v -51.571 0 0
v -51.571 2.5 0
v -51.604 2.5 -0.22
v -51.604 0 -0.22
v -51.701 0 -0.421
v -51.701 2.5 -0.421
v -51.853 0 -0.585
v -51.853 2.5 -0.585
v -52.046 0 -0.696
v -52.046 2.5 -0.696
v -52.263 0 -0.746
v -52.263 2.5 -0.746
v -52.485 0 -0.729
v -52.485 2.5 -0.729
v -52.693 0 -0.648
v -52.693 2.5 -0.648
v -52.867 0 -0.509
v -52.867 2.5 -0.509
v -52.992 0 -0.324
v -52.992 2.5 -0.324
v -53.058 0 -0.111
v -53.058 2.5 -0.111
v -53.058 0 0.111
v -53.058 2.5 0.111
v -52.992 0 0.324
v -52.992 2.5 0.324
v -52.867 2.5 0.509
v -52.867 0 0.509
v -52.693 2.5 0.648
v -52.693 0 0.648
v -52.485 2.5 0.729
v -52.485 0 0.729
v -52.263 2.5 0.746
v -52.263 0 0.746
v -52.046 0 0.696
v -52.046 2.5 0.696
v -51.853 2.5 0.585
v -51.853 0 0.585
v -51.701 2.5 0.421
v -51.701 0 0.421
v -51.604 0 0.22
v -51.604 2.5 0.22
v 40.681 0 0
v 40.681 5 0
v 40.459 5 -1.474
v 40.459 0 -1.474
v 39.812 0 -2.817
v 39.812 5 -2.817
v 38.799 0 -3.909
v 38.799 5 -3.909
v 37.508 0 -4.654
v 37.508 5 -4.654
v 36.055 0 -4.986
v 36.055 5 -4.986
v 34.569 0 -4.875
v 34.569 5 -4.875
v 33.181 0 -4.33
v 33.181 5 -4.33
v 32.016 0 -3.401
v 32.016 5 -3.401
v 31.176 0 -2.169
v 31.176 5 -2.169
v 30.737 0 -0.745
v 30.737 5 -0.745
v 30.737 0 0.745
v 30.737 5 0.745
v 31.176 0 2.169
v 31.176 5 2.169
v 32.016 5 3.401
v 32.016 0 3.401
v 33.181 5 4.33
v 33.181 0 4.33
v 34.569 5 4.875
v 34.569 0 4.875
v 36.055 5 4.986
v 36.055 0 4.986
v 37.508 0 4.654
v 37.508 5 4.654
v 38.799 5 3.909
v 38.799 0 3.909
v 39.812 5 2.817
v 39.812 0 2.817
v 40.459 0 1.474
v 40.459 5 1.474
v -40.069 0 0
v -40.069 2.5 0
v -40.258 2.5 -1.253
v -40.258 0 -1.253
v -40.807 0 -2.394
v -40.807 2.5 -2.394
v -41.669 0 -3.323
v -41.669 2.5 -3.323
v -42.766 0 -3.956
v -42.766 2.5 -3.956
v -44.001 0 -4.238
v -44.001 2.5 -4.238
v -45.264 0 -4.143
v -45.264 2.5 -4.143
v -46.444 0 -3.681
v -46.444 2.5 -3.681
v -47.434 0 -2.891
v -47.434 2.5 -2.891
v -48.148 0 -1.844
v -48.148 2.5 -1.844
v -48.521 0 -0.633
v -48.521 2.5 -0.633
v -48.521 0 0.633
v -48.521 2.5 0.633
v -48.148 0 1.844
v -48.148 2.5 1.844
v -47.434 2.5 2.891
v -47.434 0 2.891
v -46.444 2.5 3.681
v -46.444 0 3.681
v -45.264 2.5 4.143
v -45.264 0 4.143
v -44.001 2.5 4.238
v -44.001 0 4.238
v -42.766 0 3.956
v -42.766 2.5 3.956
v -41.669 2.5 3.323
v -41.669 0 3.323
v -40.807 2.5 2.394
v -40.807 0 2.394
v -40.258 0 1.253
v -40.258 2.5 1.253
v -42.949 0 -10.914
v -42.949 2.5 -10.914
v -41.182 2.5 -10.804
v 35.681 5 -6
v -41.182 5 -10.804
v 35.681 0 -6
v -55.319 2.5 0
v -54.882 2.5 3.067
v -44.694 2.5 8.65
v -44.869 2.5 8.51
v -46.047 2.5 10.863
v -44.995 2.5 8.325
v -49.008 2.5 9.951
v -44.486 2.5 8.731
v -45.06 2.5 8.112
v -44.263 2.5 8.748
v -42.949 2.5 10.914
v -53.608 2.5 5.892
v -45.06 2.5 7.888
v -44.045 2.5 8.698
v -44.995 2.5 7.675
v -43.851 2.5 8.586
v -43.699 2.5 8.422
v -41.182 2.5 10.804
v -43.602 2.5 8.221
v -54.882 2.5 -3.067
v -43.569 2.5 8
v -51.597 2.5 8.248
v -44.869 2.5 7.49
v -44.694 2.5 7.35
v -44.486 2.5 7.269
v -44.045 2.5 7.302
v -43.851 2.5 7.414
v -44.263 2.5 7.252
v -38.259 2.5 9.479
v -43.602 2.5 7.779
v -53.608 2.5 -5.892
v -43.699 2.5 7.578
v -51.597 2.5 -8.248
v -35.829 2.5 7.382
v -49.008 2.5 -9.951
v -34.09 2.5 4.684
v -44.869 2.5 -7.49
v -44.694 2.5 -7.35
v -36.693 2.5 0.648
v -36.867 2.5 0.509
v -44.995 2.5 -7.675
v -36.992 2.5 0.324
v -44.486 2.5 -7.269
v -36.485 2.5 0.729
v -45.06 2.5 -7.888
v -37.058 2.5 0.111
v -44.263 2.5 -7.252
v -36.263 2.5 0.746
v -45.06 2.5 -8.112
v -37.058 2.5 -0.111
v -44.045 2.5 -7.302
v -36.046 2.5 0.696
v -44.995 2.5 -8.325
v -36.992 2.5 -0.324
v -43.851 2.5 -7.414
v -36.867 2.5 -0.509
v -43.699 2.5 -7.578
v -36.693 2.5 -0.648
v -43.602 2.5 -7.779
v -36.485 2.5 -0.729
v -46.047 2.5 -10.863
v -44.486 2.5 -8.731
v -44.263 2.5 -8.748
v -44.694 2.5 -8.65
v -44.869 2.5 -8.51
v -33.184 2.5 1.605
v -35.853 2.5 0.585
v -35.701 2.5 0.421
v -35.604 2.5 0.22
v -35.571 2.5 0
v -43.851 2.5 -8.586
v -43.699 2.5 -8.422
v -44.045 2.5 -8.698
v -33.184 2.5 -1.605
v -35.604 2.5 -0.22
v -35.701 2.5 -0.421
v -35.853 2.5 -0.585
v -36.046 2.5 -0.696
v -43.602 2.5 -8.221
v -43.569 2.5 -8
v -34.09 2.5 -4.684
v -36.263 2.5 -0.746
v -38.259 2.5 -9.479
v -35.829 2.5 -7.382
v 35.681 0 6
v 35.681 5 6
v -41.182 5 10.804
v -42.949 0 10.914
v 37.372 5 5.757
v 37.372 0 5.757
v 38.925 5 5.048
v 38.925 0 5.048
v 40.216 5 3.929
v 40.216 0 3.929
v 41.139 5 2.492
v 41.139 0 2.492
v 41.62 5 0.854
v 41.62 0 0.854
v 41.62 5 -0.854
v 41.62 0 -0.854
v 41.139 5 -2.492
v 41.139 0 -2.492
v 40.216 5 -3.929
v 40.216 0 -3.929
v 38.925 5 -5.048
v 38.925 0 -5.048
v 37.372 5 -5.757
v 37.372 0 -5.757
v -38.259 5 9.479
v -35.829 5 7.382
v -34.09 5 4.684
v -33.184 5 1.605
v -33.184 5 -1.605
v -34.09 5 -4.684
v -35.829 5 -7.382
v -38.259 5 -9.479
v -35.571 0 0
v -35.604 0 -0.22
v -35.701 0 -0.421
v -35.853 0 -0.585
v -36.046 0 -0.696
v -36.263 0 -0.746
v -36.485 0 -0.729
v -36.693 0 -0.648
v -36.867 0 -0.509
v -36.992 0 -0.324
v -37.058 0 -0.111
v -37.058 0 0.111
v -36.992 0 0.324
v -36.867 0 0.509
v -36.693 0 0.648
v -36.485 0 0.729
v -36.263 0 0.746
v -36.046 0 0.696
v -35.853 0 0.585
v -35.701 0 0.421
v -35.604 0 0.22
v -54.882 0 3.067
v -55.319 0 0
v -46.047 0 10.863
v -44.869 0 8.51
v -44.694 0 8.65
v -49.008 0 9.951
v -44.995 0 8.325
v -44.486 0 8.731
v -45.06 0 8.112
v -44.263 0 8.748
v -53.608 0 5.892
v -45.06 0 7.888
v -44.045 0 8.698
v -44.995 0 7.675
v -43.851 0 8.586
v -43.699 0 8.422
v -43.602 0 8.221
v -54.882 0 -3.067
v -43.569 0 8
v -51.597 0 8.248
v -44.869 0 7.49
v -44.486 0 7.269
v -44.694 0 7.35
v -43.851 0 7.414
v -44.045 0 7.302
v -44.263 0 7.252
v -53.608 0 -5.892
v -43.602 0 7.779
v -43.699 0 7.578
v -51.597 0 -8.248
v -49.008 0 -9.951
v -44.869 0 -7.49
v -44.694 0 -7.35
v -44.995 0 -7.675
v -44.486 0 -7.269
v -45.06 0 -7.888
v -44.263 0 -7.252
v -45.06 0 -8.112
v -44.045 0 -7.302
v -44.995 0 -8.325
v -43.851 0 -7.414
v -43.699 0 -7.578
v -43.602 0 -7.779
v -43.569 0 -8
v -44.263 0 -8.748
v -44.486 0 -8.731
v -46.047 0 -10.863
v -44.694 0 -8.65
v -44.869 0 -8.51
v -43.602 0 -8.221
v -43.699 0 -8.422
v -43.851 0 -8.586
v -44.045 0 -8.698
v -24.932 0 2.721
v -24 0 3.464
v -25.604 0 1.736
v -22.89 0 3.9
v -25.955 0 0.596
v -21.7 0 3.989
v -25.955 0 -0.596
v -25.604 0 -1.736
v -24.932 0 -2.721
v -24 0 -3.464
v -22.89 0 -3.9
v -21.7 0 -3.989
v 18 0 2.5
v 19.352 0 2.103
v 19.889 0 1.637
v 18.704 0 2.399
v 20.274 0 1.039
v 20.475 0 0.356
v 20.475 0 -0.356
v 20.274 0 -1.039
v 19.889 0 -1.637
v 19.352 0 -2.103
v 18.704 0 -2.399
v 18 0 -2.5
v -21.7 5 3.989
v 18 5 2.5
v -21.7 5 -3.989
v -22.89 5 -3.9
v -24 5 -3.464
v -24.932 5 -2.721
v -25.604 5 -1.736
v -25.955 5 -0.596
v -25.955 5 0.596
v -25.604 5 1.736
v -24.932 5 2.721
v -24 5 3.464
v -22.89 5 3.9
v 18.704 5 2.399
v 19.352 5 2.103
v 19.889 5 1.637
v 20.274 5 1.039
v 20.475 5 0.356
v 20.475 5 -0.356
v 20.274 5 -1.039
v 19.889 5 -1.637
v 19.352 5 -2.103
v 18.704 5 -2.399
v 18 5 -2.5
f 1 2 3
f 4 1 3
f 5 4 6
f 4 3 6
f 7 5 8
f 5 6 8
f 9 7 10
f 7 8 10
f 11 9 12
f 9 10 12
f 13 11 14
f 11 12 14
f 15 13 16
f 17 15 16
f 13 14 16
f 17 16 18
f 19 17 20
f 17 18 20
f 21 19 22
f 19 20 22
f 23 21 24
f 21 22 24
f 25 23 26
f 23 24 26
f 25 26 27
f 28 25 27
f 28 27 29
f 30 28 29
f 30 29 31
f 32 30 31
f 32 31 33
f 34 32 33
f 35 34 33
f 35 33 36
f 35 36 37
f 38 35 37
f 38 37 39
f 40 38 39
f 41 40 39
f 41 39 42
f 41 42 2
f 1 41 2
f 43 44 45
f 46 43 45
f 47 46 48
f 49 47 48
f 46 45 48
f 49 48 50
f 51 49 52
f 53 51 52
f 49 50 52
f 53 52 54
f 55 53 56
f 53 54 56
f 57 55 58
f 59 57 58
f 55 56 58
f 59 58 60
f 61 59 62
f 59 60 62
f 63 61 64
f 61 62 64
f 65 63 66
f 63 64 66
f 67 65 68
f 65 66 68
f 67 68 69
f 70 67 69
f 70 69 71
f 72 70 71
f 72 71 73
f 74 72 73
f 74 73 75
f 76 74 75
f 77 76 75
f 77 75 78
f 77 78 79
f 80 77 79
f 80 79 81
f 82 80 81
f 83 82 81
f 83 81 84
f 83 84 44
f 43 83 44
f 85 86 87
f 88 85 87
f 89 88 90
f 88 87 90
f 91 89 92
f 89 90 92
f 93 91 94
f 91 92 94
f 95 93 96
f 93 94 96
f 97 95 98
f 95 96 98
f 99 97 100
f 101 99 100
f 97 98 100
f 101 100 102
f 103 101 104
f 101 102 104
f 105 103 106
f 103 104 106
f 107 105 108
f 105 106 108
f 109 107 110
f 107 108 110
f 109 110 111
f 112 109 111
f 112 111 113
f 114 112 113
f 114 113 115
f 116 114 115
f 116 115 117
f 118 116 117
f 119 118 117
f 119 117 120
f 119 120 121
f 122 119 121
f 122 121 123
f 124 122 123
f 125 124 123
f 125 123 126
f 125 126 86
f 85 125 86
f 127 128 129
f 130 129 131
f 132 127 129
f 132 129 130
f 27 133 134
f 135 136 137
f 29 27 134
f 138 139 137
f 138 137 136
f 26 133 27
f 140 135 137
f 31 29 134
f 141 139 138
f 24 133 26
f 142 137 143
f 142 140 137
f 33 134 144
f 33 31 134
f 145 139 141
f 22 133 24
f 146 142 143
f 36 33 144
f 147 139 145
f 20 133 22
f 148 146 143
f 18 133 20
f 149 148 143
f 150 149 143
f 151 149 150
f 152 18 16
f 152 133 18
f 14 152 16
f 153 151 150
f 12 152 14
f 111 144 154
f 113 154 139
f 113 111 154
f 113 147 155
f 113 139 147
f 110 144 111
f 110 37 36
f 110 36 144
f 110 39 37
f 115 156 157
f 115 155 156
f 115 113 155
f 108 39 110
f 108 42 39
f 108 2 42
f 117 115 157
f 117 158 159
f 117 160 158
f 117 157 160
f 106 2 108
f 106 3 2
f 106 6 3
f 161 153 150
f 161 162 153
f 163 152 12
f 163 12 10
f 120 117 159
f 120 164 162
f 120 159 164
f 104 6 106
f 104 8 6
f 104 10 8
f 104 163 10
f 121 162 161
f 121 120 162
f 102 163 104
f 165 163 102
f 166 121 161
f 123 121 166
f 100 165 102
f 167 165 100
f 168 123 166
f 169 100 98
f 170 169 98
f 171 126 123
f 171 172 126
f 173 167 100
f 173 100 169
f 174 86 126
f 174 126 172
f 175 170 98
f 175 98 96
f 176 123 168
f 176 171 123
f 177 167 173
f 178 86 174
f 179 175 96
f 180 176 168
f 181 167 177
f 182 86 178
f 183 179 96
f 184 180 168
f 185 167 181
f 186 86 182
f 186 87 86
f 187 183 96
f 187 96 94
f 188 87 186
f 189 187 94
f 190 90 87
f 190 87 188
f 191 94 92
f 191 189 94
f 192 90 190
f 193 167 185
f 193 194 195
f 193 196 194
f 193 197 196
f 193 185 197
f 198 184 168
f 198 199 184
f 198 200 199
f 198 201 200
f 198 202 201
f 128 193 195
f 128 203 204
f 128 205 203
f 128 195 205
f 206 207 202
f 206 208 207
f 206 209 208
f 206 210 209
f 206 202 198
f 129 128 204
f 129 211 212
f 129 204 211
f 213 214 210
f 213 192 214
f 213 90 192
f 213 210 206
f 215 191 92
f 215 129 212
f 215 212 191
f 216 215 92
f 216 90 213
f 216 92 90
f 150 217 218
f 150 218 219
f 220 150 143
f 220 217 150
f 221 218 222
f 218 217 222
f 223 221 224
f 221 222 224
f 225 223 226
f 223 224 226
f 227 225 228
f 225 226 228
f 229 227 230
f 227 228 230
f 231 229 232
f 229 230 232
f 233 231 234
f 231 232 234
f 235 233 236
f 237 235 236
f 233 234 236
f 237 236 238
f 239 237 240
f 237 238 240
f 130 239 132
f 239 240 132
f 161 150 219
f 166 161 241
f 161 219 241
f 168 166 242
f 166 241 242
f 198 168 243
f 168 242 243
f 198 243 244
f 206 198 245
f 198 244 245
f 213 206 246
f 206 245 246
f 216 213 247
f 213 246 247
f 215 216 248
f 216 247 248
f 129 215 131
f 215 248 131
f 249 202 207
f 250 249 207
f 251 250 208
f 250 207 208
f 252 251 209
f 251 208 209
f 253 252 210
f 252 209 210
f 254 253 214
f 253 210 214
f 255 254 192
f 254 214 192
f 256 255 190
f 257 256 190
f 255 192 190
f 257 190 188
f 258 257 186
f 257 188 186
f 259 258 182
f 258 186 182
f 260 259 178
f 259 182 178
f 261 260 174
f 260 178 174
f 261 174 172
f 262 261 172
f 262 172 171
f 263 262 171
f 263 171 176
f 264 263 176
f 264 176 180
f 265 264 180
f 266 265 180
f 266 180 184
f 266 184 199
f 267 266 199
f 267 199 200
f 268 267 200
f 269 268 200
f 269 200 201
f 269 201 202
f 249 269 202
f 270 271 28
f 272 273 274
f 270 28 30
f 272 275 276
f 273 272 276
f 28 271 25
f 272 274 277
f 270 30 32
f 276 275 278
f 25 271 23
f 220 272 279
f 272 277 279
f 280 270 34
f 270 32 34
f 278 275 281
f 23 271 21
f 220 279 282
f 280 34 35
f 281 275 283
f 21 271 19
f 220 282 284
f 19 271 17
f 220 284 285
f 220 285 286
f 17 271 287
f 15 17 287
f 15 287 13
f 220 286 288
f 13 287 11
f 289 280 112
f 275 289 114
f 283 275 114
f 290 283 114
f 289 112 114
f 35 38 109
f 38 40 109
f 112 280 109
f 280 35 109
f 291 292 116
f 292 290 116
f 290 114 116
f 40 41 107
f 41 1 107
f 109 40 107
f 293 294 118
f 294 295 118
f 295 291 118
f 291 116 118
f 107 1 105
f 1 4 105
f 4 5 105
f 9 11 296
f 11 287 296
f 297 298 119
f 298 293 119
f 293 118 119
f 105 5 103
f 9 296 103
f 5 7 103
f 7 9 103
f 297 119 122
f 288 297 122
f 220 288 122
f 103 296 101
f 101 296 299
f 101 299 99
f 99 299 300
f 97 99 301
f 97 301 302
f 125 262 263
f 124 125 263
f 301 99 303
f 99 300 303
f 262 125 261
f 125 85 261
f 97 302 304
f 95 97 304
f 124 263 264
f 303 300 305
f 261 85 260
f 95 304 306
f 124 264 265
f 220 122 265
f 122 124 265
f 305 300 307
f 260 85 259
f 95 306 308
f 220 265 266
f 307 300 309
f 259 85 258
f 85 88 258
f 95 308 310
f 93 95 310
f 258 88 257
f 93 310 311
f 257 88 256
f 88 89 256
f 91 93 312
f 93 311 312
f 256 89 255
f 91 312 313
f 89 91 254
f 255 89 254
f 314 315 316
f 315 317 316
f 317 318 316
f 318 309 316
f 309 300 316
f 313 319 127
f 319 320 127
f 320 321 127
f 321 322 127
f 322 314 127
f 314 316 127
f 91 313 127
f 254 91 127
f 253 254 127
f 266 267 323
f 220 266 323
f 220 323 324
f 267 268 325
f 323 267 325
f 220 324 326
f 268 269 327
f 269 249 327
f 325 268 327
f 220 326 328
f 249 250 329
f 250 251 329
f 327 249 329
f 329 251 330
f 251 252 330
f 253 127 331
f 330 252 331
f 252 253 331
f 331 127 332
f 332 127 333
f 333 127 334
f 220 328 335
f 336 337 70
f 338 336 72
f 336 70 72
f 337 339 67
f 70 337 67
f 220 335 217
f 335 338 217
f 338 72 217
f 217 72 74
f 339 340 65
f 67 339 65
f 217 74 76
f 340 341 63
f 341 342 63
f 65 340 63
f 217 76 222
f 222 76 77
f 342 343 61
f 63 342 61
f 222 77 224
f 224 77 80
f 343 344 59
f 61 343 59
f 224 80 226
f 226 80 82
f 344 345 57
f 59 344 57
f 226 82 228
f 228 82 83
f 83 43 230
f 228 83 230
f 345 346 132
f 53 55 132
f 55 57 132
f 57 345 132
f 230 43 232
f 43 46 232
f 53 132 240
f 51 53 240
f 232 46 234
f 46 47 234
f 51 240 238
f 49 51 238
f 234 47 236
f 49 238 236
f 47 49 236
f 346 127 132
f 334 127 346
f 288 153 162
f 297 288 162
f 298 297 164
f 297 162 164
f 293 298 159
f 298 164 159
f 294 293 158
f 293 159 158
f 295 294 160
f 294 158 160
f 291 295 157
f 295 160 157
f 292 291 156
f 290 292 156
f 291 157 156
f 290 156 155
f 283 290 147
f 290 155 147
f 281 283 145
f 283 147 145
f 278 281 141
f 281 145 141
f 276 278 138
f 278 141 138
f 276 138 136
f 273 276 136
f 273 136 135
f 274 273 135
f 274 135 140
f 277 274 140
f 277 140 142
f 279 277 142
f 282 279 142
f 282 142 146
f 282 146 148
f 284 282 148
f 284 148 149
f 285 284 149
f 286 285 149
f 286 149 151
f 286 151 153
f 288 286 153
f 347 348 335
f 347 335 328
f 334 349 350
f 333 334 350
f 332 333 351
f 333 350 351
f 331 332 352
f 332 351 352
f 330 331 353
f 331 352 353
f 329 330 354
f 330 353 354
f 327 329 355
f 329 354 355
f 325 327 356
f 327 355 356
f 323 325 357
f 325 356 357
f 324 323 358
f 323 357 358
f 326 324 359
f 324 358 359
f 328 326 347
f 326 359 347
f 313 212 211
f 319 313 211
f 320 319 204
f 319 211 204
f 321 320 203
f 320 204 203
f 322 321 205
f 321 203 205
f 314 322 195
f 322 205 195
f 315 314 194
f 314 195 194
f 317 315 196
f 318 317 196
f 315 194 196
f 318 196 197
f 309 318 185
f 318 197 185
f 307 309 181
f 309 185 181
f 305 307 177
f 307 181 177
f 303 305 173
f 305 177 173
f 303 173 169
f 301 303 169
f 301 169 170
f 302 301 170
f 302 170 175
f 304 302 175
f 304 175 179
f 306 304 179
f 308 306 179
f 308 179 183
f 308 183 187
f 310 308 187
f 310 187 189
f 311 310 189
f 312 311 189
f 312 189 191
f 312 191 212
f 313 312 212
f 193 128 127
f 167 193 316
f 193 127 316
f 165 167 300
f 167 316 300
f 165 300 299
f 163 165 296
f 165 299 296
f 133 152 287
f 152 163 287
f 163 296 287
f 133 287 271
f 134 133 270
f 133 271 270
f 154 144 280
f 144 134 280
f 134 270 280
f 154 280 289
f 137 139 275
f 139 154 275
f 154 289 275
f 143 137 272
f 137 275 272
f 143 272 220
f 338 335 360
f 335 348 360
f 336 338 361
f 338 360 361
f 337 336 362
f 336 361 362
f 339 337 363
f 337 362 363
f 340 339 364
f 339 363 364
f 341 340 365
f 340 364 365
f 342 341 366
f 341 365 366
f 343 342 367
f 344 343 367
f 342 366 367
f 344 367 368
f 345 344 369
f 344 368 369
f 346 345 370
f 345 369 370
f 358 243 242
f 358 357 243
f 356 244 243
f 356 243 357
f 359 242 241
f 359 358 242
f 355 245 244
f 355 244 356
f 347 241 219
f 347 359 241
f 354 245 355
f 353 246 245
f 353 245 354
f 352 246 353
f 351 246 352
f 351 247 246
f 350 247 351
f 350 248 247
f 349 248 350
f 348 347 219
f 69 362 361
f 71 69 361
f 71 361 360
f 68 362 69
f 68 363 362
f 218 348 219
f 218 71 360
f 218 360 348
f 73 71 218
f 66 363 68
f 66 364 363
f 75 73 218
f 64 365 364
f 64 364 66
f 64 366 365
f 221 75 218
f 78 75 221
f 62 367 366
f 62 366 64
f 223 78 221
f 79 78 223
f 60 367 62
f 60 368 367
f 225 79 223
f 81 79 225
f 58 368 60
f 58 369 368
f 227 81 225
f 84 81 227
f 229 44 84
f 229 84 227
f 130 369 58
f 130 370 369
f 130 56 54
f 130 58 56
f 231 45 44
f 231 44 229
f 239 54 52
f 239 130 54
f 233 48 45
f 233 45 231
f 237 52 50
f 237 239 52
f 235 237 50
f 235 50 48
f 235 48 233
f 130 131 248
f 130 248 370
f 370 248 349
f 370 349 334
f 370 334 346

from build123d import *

# Parameters (mm, degrees)
SKETCH_1_R          = 11
EXTRUDE_1_DEPTH     = 5
SKETCH_1_R_2        = 6
EXTRUDE_1_2_DEPTH   = 5
EXTRUDE_3_DEPTH     = 5
SKETCH_4_R          = 11.25
CUT_EXTRUDE_1_DEPTH = 2.5
SKETCH_5_R          = 5
CUT_EXTRUDE_2_DEPTH = 6
SKETCH_6_R          = 4
SKETCH_6_R_2        = 2.5
CUT_EXTRUDE_3_DEPTH = 6
CUT_EXTRUDE_4_DEPTH = 6
SKETCH_8_R          = 0.747737987
SKETCH_8_R_2        = 0.75
CUT_EXTRUDE_5_DEPTH = 3.5
SKETCH_9_R          = 4.25
CUT_EXTRUDE_6_DEPTH = 3.5


with BuildPart() as part:
    # 草图1 → 凸台-拉伸1 (new body)
    with BuildSketch(Plane(origin=(0, 0, 0), x_dir=(1, 0, 0), z_dir=(0, 1, 0))):
        with Locations((-44.318784969, 0)):
            Circle(SKETCH_1_R)
    extrude(amount=EXTRUDE_1_DEPTH)



with BuildPart() as body_2:
    # 草图1 → Extrude 1 2 (new body)
    with BuildSketch(Plane(origin=(0, 0, 0), x_dir=(1, 0, 0), z_dir=(0, 1, 0))):
        with Locations((35.681215031, 0)):
            Circle(SKETCH_1_R_2)
    extrude(amount=EXTRUDE_1_2_DEPTH)


with BuildPart() as part_1:
    add(part.part)

    add(body_2.part)  # 凸台-拉伸3 merges body 2
    # 草图3 → 凸台-拉伸3 (add)
    with BuildSketch(Plane(origin=(0, 0, 0), x_dir=(1, 0, 0), z_dir=(0, 1, 0))):
        Polygon((-44.318784969, 11), (35.681215031, 6), (35.681215031, -6), (-44.318784969, -11), align=None)
    extrude(amount=EXTRUDE_3_DEPTH)

    # 草图4 → 切除-拉伸1 (cut)
    with BuildSketch(Plane(origin=(0, 5, 0), x_dir=(1, 0, 0), z_dir=(0, 1, 0))):
        with Locations((-44.318784969, 0)):
            Circle(SKETCH_4_R)
    extrude(amount=-CUT_EXTRUDE_1_DEPTH, mode=Mode.SUBTRACT)

    # 草图5 → 切除-拉伸2 (cut, through all)
    with BuildSketch(Plane(origin=(0, 5, 0), x_dir=(1, 0, 0), z_dir=(0, 1, 0))):
        with Locations((35.681215031, 0)):
            Circle(SKETCH_5_R)
    extrude(amount=-CUT_EXTRUDE_2_DEPTH, mode=Mode.SUBTRACT)

    # 草图6 → 切除-拉伸3 (cut, through all)
    with BuildSketch(Plane(origin=(0, 5, 0), x_dir=(1, 0, 0), z_dir=(0, 1, 0))):
        with Locations((-22, 0)):
            Circle(SKETCH_6_R)
        with Locations((18, 0)):
            Circle(SKETCH_6_R_2)
    extrude(amount=-CUT_EXTRUDE_3_DEPTH, mode=Mode.SUBTRACT)

    # 草图7 → 切除-拉伸4 (cut, through all)
    with BuildSketch(Plane(origin=(0, 5, 0), x_dir=(1, 0, 0), z_dir=(0, 1, 0))):
        Polygon((-22, 4), (18, 2.5), (18, -2.5), (-22, -4), align=None)
    extrude(amount=-CUT_EXTRUDE_4_DEPTH, mode=Mode.SUBTRACT)

    # 草图8 → 切除-拉伸5 (cut, through all)
    with BuildSketch(Plane(origin=(0, 2.5, 0), x_dir=(1, 0, 0), z_dir=(0, 1, 0))):
        with Locations((-52.318784969, 0)):
            Circle(SKETCH_8_R)
        with Locations((-36.318784969, 0)):
            Circle(SKETCH_8_R)
        with Locations((-44.318784969, 8)):
            Circle(SKETCH_8_R_2)
        with Locations((-44.318784969, -8)):
            Circle(SKETCH_8_R_2)
    extrude(amount=-CUT_EXTRUDE_5_DEPTH, mode=Mode.SUBTRACT)

    # 草图9 → 切除-拉伸6 (cut, through all)
    with BuildSketch(Plane(origin=(0, 2.5, 0), x_dir=(1, 0, 0), z_dir=(0, 1, 0))):
        with Locations((-44.318784969, 0)):
            Circle(SKETCH_9_R)
    extrude(amount=-CUT_EXTRUDE_6_DEPTH, mode=Mode.SUBTRACT)


solid = part_1.part
